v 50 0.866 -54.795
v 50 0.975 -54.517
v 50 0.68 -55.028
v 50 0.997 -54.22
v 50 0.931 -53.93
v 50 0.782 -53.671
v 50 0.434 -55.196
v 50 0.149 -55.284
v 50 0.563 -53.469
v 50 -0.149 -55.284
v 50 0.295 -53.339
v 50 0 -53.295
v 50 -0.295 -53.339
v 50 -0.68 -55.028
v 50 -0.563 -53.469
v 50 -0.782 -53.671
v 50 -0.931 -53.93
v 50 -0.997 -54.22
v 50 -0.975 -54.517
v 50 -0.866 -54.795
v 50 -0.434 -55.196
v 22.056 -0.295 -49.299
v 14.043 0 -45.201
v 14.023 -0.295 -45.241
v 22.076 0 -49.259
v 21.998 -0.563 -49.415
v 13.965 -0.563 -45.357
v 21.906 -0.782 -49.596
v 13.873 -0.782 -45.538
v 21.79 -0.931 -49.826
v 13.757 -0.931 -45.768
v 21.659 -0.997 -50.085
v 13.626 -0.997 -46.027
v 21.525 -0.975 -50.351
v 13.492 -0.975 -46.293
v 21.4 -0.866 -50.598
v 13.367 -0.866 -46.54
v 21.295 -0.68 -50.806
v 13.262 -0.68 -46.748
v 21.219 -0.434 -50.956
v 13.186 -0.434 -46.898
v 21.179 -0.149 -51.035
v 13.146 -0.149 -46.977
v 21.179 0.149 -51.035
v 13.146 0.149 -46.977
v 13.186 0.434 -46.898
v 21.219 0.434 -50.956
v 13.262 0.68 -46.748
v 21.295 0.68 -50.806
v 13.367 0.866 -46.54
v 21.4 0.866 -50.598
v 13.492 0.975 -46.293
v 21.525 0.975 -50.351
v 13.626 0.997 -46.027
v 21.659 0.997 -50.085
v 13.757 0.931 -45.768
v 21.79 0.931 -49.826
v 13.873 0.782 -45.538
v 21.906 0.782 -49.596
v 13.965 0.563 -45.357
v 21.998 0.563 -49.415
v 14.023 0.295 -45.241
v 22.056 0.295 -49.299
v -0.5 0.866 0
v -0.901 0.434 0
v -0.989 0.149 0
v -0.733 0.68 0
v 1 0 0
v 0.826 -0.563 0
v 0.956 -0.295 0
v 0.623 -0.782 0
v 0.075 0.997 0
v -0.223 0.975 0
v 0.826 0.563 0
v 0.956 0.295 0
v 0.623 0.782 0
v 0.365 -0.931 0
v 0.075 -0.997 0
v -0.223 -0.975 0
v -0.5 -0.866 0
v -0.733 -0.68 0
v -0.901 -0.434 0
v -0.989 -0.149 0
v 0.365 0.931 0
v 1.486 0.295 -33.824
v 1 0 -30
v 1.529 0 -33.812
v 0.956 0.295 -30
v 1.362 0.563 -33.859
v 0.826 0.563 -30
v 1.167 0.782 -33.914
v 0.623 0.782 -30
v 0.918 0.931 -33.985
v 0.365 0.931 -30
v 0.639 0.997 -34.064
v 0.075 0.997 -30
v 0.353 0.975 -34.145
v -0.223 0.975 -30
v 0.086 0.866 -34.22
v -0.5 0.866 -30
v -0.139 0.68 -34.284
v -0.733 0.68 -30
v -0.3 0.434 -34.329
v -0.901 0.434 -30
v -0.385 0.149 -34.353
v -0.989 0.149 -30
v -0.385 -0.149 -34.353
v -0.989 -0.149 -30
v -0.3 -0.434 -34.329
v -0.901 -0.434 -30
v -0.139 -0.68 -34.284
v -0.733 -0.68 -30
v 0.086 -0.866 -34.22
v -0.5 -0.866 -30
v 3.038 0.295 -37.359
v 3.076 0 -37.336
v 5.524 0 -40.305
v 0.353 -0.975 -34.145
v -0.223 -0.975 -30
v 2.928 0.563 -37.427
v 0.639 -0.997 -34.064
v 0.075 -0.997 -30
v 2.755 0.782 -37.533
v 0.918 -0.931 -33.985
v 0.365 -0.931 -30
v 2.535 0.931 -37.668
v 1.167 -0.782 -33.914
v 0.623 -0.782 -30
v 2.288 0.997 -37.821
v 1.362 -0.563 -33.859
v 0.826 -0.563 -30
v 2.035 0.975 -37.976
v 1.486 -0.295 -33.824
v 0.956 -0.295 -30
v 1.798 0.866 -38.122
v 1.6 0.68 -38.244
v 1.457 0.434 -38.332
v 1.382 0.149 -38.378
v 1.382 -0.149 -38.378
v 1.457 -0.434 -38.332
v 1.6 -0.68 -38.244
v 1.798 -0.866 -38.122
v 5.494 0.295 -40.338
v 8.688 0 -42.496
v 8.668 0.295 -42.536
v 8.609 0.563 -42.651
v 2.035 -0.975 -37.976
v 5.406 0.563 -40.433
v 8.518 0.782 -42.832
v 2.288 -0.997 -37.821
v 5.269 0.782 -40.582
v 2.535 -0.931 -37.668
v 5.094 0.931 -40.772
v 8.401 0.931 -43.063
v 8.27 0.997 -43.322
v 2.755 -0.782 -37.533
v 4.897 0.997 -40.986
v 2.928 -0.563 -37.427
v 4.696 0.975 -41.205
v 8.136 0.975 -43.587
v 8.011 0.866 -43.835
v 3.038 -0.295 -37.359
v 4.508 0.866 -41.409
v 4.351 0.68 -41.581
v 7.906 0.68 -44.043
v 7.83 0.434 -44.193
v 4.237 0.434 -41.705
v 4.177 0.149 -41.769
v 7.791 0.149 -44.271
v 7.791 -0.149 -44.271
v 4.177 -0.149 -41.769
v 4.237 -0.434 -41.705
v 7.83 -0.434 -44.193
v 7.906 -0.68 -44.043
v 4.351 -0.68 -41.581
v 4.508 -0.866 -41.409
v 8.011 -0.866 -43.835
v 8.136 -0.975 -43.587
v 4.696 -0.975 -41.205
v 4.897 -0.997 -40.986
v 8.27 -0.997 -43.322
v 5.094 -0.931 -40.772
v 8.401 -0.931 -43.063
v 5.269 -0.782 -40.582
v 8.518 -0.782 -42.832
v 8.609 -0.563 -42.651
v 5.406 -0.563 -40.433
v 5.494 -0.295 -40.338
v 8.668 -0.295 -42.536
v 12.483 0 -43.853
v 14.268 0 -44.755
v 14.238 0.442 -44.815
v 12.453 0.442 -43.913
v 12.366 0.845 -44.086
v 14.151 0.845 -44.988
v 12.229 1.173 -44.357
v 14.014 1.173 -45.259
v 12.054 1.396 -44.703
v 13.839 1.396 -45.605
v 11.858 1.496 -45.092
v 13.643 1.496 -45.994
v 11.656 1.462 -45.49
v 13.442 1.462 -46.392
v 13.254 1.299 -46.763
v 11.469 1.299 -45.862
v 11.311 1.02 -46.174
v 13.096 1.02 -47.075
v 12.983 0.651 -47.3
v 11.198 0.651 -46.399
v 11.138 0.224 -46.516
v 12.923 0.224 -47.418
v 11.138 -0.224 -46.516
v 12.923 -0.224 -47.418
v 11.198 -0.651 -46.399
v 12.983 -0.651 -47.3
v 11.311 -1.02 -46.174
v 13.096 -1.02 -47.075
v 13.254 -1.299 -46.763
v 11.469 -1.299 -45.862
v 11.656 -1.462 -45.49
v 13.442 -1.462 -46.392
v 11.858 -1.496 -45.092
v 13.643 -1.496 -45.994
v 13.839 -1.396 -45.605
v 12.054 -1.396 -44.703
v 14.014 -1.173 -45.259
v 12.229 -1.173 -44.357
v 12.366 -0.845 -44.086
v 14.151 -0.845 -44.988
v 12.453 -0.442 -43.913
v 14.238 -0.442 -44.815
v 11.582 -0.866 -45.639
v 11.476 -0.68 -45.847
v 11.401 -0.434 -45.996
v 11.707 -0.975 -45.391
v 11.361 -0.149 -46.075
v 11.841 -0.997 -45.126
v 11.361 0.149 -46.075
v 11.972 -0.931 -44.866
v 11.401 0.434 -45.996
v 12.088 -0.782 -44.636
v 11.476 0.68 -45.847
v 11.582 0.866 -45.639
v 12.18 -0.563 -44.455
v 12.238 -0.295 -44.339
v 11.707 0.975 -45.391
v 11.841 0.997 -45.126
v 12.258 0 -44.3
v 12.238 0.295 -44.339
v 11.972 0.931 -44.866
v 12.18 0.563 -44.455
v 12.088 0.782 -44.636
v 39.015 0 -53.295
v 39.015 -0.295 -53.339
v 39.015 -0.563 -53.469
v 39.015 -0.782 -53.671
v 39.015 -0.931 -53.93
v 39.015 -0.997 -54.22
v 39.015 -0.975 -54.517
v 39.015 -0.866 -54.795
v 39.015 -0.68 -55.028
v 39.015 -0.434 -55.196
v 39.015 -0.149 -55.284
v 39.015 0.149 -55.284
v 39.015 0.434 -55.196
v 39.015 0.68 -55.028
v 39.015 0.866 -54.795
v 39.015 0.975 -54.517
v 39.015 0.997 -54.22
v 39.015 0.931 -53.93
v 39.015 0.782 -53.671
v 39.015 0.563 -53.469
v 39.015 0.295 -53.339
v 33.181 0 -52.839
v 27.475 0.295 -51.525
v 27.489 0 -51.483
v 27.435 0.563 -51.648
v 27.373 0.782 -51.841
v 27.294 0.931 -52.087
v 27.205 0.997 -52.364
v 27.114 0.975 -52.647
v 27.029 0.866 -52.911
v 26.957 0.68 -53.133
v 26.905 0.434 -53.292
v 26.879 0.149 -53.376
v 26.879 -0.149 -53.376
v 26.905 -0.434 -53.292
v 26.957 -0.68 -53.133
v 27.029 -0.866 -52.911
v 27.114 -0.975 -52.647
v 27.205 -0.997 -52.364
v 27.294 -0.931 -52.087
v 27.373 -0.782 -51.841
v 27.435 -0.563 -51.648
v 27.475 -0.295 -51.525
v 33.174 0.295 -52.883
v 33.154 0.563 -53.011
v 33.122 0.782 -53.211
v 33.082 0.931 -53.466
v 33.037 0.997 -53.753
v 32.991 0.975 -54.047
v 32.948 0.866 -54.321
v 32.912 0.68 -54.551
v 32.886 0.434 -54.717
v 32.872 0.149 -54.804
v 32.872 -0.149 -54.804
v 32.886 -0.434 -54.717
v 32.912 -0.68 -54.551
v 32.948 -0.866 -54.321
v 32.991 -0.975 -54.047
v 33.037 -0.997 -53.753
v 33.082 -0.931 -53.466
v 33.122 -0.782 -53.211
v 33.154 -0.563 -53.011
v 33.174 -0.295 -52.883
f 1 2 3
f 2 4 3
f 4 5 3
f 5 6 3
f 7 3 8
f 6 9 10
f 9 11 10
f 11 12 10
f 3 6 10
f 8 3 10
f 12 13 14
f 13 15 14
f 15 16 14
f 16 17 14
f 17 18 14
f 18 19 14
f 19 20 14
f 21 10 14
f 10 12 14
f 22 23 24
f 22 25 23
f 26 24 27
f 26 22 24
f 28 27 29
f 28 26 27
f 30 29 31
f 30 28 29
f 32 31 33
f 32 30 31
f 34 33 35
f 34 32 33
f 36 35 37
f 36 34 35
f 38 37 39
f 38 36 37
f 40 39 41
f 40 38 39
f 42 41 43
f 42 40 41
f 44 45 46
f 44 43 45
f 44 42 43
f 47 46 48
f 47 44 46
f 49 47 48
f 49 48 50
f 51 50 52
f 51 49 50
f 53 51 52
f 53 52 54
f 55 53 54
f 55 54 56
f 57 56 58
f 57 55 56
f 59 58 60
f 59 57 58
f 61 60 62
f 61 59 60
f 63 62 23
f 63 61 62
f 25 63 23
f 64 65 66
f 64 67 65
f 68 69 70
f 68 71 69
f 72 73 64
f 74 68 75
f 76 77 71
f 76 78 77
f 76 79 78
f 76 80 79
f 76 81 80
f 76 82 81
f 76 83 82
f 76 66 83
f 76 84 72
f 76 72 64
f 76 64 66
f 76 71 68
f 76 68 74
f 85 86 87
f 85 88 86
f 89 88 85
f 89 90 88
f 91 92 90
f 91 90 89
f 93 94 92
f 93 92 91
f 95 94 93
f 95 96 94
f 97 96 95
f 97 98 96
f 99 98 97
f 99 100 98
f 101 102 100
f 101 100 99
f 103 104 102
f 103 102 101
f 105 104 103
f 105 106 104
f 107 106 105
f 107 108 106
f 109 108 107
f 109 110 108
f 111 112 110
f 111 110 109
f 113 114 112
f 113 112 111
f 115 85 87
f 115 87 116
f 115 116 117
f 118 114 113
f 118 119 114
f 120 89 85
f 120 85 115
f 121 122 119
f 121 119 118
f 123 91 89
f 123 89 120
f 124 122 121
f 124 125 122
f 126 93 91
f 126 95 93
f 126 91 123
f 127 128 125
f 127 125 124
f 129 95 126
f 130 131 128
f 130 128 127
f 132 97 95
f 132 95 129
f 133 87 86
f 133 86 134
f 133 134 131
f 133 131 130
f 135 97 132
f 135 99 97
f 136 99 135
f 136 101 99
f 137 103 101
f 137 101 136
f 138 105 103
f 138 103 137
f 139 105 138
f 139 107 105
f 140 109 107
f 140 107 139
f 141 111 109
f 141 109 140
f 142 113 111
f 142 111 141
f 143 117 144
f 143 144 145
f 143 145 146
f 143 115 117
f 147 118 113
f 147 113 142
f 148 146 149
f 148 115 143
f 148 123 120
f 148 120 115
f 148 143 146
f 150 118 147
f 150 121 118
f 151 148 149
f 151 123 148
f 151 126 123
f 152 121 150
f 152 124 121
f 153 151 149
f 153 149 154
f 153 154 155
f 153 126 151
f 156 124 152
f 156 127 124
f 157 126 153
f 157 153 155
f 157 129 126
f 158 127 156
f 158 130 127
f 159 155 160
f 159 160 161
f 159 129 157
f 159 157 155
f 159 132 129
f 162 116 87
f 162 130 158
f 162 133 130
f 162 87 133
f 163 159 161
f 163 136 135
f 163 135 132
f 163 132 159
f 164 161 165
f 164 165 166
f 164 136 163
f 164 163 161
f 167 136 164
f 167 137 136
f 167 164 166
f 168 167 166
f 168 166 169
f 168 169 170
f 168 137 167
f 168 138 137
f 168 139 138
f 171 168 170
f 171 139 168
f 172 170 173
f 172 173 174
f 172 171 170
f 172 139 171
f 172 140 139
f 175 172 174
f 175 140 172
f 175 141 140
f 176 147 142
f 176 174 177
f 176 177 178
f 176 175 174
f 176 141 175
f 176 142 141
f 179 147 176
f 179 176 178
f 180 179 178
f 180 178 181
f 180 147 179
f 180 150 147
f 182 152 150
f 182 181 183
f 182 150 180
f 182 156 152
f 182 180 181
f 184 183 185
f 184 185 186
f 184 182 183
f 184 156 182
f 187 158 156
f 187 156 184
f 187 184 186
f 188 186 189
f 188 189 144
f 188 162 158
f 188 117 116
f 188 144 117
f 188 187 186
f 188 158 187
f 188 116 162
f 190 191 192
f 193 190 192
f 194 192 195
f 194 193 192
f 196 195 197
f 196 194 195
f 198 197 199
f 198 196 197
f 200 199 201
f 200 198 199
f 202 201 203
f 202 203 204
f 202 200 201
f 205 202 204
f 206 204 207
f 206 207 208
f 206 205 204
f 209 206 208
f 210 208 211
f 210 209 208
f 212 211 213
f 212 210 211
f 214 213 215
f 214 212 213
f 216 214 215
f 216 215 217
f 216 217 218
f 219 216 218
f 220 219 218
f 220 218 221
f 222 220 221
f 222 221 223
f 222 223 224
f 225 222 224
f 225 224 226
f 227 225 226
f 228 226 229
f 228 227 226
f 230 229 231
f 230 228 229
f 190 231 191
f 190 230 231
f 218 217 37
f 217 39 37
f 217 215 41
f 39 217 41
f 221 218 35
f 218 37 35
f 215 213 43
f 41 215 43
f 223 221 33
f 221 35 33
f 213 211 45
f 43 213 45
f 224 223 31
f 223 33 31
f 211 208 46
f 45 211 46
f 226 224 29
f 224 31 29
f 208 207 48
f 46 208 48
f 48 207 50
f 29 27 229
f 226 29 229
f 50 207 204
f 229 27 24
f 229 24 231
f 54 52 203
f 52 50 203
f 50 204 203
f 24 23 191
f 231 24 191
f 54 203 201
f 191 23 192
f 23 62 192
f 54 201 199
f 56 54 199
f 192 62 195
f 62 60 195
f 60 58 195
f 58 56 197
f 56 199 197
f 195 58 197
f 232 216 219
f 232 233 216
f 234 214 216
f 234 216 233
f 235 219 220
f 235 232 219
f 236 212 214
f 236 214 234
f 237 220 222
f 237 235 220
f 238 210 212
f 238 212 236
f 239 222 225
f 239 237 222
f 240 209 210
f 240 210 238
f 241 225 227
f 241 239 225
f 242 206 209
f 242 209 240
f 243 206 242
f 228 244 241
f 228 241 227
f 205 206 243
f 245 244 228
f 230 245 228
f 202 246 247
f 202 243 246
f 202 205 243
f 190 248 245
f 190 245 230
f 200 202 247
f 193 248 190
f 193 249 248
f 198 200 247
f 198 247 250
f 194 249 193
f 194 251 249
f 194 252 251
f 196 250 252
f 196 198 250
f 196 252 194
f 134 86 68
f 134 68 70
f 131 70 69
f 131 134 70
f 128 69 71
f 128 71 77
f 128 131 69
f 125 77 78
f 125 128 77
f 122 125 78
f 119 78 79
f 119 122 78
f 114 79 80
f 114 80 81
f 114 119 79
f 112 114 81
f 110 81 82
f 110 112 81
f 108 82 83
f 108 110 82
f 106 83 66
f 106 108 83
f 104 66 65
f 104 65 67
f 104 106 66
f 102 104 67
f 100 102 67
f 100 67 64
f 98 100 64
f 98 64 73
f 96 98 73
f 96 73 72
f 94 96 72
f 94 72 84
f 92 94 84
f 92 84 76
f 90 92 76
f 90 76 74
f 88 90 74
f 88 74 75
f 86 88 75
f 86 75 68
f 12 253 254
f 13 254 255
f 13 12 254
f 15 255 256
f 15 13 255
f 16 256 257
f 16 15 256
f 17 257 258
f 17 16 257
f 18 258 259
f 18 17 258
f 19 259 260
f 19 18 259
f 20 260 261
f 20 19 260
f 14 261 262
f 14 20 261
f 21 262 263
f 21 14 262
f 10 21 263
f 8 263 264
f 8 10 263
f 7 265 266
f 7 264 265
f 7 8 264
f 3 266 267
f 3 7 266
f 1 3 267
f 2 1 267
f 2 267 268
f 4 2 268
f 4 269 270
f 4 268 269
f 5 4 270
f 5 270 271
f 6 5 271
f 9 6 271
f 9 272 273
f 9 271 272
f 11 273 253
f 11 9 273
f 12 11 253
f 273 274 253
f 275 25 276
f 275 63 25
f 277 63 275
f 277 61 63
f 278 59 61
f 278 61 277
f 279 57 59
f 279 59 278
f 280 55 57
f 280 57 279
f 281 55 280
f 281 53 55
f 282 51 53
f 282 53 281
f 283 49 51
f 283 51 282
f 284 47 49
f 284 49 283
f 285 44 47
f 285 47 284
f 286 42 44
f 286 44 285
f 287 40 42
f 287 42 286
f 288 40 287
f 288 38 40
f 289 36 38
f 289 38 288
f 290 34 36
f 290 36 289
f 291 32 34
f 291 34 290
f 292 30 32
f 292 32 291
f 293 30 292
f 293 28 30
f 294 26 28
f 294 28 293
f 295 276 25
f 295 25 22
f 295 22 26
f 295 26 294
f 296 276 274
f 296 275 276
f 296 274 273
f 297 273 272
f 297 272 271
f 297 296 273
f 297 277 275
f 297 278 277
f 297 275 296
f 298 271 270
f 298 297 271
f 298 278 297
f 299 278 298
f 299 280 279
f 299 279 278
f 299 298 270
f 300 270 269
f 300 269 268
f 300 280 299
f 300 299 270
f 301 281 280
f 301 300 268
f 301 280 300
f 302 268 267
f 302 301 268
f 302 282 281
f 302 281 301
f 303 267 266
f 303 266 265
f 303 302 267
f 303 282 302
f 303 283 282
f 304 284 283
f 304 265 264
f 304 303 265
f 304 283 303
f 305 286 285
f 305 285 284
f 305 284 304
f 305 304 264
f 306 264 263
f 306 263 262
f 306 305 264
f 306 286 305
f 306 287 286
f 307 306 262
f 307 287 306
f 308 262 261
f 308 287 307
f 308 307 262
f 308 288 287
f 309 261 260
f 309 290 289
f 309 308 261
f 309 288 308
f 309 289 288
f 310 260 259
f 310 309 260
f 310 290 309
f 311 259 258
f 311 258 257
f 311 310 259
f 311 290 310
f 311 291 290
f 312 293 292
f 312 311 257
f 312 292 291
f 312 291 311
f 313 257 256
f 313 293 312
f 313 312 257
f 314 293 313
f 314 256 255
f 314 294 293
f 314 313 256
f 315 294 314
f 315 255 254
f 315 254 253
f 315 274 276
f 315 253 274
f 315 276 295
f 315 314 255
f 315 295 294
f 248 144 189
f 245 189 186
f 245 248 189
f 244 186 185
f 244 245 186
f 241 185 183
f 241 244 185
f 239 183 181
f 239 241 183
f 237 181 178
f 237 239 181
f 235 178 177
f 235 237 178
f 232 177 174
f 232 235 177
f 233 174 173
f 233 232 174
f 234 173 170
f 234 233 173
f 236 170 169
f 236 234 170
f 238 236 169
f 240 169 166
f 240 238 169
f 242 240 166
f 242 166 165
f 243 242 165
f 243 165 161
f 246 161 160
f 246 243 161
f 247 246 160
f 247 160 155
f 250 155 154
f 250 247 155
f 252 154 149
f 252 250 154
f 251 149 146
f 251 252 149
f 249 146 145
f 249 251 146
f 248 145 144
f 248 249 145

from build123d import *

# Parameters (mm, degrees)
ESQUISSE2_R        = 1
ESQUISSE3_R        = 1.5
ESQUISSE3_R_2      = 1
EXTRU_MINCE1_DEPTH = 1


with BuildPart() as part:
    # Balayage1: sweep along a path in Esquisse1
    with BuildLine(Plane(origin=(0, 0, 0), x_dir=(1, 0, 0), z_dir=(0, 1, 0))) as balayage1_path:
        Line((0, 0), (0, 30))
        ThreePointArc((0, 30), (2.22403872, 37.8596955), (8.236641781, 43.388688719))
        Line((8.236641781, 43.388688719), (21.6253305, 50.152046937))
        ThreePointArc((21.6253305, 50.152046937), (30.076611959, 53.244881504), (39.014580281, 54.29488448))
        Line((39.014580281, 54.29488448), (50, 54.29488448))
    # Esquisse2 → Balayage1 (sweep)
    with BuildSketch(Plane.XY):
        Circle(ESQUISSE2_R)
    sweep(path=balayage1_path.line)

    # Esquisse3 → Extru.-Mince1 (add, symmetric)
    with BuildSketch(Plane(origin=(28.487028331, 0, -14.390354518), x_dir=(0.450890548, 0, 0.892579248), z_dir=(-0.892579248, 0, 0.450890548))):
        with Locations((-35.014019219, 0)):
            Circle(ESQUISSE3_R)
        with Locations((-35.014019219, 0)):
            Circle(ESQUISSE3_R_2, mode=Mode.SUBTRACT)
    extrude(amount=EXTRU_MINCE1_DEPTH, both=True)


solid = part.part
